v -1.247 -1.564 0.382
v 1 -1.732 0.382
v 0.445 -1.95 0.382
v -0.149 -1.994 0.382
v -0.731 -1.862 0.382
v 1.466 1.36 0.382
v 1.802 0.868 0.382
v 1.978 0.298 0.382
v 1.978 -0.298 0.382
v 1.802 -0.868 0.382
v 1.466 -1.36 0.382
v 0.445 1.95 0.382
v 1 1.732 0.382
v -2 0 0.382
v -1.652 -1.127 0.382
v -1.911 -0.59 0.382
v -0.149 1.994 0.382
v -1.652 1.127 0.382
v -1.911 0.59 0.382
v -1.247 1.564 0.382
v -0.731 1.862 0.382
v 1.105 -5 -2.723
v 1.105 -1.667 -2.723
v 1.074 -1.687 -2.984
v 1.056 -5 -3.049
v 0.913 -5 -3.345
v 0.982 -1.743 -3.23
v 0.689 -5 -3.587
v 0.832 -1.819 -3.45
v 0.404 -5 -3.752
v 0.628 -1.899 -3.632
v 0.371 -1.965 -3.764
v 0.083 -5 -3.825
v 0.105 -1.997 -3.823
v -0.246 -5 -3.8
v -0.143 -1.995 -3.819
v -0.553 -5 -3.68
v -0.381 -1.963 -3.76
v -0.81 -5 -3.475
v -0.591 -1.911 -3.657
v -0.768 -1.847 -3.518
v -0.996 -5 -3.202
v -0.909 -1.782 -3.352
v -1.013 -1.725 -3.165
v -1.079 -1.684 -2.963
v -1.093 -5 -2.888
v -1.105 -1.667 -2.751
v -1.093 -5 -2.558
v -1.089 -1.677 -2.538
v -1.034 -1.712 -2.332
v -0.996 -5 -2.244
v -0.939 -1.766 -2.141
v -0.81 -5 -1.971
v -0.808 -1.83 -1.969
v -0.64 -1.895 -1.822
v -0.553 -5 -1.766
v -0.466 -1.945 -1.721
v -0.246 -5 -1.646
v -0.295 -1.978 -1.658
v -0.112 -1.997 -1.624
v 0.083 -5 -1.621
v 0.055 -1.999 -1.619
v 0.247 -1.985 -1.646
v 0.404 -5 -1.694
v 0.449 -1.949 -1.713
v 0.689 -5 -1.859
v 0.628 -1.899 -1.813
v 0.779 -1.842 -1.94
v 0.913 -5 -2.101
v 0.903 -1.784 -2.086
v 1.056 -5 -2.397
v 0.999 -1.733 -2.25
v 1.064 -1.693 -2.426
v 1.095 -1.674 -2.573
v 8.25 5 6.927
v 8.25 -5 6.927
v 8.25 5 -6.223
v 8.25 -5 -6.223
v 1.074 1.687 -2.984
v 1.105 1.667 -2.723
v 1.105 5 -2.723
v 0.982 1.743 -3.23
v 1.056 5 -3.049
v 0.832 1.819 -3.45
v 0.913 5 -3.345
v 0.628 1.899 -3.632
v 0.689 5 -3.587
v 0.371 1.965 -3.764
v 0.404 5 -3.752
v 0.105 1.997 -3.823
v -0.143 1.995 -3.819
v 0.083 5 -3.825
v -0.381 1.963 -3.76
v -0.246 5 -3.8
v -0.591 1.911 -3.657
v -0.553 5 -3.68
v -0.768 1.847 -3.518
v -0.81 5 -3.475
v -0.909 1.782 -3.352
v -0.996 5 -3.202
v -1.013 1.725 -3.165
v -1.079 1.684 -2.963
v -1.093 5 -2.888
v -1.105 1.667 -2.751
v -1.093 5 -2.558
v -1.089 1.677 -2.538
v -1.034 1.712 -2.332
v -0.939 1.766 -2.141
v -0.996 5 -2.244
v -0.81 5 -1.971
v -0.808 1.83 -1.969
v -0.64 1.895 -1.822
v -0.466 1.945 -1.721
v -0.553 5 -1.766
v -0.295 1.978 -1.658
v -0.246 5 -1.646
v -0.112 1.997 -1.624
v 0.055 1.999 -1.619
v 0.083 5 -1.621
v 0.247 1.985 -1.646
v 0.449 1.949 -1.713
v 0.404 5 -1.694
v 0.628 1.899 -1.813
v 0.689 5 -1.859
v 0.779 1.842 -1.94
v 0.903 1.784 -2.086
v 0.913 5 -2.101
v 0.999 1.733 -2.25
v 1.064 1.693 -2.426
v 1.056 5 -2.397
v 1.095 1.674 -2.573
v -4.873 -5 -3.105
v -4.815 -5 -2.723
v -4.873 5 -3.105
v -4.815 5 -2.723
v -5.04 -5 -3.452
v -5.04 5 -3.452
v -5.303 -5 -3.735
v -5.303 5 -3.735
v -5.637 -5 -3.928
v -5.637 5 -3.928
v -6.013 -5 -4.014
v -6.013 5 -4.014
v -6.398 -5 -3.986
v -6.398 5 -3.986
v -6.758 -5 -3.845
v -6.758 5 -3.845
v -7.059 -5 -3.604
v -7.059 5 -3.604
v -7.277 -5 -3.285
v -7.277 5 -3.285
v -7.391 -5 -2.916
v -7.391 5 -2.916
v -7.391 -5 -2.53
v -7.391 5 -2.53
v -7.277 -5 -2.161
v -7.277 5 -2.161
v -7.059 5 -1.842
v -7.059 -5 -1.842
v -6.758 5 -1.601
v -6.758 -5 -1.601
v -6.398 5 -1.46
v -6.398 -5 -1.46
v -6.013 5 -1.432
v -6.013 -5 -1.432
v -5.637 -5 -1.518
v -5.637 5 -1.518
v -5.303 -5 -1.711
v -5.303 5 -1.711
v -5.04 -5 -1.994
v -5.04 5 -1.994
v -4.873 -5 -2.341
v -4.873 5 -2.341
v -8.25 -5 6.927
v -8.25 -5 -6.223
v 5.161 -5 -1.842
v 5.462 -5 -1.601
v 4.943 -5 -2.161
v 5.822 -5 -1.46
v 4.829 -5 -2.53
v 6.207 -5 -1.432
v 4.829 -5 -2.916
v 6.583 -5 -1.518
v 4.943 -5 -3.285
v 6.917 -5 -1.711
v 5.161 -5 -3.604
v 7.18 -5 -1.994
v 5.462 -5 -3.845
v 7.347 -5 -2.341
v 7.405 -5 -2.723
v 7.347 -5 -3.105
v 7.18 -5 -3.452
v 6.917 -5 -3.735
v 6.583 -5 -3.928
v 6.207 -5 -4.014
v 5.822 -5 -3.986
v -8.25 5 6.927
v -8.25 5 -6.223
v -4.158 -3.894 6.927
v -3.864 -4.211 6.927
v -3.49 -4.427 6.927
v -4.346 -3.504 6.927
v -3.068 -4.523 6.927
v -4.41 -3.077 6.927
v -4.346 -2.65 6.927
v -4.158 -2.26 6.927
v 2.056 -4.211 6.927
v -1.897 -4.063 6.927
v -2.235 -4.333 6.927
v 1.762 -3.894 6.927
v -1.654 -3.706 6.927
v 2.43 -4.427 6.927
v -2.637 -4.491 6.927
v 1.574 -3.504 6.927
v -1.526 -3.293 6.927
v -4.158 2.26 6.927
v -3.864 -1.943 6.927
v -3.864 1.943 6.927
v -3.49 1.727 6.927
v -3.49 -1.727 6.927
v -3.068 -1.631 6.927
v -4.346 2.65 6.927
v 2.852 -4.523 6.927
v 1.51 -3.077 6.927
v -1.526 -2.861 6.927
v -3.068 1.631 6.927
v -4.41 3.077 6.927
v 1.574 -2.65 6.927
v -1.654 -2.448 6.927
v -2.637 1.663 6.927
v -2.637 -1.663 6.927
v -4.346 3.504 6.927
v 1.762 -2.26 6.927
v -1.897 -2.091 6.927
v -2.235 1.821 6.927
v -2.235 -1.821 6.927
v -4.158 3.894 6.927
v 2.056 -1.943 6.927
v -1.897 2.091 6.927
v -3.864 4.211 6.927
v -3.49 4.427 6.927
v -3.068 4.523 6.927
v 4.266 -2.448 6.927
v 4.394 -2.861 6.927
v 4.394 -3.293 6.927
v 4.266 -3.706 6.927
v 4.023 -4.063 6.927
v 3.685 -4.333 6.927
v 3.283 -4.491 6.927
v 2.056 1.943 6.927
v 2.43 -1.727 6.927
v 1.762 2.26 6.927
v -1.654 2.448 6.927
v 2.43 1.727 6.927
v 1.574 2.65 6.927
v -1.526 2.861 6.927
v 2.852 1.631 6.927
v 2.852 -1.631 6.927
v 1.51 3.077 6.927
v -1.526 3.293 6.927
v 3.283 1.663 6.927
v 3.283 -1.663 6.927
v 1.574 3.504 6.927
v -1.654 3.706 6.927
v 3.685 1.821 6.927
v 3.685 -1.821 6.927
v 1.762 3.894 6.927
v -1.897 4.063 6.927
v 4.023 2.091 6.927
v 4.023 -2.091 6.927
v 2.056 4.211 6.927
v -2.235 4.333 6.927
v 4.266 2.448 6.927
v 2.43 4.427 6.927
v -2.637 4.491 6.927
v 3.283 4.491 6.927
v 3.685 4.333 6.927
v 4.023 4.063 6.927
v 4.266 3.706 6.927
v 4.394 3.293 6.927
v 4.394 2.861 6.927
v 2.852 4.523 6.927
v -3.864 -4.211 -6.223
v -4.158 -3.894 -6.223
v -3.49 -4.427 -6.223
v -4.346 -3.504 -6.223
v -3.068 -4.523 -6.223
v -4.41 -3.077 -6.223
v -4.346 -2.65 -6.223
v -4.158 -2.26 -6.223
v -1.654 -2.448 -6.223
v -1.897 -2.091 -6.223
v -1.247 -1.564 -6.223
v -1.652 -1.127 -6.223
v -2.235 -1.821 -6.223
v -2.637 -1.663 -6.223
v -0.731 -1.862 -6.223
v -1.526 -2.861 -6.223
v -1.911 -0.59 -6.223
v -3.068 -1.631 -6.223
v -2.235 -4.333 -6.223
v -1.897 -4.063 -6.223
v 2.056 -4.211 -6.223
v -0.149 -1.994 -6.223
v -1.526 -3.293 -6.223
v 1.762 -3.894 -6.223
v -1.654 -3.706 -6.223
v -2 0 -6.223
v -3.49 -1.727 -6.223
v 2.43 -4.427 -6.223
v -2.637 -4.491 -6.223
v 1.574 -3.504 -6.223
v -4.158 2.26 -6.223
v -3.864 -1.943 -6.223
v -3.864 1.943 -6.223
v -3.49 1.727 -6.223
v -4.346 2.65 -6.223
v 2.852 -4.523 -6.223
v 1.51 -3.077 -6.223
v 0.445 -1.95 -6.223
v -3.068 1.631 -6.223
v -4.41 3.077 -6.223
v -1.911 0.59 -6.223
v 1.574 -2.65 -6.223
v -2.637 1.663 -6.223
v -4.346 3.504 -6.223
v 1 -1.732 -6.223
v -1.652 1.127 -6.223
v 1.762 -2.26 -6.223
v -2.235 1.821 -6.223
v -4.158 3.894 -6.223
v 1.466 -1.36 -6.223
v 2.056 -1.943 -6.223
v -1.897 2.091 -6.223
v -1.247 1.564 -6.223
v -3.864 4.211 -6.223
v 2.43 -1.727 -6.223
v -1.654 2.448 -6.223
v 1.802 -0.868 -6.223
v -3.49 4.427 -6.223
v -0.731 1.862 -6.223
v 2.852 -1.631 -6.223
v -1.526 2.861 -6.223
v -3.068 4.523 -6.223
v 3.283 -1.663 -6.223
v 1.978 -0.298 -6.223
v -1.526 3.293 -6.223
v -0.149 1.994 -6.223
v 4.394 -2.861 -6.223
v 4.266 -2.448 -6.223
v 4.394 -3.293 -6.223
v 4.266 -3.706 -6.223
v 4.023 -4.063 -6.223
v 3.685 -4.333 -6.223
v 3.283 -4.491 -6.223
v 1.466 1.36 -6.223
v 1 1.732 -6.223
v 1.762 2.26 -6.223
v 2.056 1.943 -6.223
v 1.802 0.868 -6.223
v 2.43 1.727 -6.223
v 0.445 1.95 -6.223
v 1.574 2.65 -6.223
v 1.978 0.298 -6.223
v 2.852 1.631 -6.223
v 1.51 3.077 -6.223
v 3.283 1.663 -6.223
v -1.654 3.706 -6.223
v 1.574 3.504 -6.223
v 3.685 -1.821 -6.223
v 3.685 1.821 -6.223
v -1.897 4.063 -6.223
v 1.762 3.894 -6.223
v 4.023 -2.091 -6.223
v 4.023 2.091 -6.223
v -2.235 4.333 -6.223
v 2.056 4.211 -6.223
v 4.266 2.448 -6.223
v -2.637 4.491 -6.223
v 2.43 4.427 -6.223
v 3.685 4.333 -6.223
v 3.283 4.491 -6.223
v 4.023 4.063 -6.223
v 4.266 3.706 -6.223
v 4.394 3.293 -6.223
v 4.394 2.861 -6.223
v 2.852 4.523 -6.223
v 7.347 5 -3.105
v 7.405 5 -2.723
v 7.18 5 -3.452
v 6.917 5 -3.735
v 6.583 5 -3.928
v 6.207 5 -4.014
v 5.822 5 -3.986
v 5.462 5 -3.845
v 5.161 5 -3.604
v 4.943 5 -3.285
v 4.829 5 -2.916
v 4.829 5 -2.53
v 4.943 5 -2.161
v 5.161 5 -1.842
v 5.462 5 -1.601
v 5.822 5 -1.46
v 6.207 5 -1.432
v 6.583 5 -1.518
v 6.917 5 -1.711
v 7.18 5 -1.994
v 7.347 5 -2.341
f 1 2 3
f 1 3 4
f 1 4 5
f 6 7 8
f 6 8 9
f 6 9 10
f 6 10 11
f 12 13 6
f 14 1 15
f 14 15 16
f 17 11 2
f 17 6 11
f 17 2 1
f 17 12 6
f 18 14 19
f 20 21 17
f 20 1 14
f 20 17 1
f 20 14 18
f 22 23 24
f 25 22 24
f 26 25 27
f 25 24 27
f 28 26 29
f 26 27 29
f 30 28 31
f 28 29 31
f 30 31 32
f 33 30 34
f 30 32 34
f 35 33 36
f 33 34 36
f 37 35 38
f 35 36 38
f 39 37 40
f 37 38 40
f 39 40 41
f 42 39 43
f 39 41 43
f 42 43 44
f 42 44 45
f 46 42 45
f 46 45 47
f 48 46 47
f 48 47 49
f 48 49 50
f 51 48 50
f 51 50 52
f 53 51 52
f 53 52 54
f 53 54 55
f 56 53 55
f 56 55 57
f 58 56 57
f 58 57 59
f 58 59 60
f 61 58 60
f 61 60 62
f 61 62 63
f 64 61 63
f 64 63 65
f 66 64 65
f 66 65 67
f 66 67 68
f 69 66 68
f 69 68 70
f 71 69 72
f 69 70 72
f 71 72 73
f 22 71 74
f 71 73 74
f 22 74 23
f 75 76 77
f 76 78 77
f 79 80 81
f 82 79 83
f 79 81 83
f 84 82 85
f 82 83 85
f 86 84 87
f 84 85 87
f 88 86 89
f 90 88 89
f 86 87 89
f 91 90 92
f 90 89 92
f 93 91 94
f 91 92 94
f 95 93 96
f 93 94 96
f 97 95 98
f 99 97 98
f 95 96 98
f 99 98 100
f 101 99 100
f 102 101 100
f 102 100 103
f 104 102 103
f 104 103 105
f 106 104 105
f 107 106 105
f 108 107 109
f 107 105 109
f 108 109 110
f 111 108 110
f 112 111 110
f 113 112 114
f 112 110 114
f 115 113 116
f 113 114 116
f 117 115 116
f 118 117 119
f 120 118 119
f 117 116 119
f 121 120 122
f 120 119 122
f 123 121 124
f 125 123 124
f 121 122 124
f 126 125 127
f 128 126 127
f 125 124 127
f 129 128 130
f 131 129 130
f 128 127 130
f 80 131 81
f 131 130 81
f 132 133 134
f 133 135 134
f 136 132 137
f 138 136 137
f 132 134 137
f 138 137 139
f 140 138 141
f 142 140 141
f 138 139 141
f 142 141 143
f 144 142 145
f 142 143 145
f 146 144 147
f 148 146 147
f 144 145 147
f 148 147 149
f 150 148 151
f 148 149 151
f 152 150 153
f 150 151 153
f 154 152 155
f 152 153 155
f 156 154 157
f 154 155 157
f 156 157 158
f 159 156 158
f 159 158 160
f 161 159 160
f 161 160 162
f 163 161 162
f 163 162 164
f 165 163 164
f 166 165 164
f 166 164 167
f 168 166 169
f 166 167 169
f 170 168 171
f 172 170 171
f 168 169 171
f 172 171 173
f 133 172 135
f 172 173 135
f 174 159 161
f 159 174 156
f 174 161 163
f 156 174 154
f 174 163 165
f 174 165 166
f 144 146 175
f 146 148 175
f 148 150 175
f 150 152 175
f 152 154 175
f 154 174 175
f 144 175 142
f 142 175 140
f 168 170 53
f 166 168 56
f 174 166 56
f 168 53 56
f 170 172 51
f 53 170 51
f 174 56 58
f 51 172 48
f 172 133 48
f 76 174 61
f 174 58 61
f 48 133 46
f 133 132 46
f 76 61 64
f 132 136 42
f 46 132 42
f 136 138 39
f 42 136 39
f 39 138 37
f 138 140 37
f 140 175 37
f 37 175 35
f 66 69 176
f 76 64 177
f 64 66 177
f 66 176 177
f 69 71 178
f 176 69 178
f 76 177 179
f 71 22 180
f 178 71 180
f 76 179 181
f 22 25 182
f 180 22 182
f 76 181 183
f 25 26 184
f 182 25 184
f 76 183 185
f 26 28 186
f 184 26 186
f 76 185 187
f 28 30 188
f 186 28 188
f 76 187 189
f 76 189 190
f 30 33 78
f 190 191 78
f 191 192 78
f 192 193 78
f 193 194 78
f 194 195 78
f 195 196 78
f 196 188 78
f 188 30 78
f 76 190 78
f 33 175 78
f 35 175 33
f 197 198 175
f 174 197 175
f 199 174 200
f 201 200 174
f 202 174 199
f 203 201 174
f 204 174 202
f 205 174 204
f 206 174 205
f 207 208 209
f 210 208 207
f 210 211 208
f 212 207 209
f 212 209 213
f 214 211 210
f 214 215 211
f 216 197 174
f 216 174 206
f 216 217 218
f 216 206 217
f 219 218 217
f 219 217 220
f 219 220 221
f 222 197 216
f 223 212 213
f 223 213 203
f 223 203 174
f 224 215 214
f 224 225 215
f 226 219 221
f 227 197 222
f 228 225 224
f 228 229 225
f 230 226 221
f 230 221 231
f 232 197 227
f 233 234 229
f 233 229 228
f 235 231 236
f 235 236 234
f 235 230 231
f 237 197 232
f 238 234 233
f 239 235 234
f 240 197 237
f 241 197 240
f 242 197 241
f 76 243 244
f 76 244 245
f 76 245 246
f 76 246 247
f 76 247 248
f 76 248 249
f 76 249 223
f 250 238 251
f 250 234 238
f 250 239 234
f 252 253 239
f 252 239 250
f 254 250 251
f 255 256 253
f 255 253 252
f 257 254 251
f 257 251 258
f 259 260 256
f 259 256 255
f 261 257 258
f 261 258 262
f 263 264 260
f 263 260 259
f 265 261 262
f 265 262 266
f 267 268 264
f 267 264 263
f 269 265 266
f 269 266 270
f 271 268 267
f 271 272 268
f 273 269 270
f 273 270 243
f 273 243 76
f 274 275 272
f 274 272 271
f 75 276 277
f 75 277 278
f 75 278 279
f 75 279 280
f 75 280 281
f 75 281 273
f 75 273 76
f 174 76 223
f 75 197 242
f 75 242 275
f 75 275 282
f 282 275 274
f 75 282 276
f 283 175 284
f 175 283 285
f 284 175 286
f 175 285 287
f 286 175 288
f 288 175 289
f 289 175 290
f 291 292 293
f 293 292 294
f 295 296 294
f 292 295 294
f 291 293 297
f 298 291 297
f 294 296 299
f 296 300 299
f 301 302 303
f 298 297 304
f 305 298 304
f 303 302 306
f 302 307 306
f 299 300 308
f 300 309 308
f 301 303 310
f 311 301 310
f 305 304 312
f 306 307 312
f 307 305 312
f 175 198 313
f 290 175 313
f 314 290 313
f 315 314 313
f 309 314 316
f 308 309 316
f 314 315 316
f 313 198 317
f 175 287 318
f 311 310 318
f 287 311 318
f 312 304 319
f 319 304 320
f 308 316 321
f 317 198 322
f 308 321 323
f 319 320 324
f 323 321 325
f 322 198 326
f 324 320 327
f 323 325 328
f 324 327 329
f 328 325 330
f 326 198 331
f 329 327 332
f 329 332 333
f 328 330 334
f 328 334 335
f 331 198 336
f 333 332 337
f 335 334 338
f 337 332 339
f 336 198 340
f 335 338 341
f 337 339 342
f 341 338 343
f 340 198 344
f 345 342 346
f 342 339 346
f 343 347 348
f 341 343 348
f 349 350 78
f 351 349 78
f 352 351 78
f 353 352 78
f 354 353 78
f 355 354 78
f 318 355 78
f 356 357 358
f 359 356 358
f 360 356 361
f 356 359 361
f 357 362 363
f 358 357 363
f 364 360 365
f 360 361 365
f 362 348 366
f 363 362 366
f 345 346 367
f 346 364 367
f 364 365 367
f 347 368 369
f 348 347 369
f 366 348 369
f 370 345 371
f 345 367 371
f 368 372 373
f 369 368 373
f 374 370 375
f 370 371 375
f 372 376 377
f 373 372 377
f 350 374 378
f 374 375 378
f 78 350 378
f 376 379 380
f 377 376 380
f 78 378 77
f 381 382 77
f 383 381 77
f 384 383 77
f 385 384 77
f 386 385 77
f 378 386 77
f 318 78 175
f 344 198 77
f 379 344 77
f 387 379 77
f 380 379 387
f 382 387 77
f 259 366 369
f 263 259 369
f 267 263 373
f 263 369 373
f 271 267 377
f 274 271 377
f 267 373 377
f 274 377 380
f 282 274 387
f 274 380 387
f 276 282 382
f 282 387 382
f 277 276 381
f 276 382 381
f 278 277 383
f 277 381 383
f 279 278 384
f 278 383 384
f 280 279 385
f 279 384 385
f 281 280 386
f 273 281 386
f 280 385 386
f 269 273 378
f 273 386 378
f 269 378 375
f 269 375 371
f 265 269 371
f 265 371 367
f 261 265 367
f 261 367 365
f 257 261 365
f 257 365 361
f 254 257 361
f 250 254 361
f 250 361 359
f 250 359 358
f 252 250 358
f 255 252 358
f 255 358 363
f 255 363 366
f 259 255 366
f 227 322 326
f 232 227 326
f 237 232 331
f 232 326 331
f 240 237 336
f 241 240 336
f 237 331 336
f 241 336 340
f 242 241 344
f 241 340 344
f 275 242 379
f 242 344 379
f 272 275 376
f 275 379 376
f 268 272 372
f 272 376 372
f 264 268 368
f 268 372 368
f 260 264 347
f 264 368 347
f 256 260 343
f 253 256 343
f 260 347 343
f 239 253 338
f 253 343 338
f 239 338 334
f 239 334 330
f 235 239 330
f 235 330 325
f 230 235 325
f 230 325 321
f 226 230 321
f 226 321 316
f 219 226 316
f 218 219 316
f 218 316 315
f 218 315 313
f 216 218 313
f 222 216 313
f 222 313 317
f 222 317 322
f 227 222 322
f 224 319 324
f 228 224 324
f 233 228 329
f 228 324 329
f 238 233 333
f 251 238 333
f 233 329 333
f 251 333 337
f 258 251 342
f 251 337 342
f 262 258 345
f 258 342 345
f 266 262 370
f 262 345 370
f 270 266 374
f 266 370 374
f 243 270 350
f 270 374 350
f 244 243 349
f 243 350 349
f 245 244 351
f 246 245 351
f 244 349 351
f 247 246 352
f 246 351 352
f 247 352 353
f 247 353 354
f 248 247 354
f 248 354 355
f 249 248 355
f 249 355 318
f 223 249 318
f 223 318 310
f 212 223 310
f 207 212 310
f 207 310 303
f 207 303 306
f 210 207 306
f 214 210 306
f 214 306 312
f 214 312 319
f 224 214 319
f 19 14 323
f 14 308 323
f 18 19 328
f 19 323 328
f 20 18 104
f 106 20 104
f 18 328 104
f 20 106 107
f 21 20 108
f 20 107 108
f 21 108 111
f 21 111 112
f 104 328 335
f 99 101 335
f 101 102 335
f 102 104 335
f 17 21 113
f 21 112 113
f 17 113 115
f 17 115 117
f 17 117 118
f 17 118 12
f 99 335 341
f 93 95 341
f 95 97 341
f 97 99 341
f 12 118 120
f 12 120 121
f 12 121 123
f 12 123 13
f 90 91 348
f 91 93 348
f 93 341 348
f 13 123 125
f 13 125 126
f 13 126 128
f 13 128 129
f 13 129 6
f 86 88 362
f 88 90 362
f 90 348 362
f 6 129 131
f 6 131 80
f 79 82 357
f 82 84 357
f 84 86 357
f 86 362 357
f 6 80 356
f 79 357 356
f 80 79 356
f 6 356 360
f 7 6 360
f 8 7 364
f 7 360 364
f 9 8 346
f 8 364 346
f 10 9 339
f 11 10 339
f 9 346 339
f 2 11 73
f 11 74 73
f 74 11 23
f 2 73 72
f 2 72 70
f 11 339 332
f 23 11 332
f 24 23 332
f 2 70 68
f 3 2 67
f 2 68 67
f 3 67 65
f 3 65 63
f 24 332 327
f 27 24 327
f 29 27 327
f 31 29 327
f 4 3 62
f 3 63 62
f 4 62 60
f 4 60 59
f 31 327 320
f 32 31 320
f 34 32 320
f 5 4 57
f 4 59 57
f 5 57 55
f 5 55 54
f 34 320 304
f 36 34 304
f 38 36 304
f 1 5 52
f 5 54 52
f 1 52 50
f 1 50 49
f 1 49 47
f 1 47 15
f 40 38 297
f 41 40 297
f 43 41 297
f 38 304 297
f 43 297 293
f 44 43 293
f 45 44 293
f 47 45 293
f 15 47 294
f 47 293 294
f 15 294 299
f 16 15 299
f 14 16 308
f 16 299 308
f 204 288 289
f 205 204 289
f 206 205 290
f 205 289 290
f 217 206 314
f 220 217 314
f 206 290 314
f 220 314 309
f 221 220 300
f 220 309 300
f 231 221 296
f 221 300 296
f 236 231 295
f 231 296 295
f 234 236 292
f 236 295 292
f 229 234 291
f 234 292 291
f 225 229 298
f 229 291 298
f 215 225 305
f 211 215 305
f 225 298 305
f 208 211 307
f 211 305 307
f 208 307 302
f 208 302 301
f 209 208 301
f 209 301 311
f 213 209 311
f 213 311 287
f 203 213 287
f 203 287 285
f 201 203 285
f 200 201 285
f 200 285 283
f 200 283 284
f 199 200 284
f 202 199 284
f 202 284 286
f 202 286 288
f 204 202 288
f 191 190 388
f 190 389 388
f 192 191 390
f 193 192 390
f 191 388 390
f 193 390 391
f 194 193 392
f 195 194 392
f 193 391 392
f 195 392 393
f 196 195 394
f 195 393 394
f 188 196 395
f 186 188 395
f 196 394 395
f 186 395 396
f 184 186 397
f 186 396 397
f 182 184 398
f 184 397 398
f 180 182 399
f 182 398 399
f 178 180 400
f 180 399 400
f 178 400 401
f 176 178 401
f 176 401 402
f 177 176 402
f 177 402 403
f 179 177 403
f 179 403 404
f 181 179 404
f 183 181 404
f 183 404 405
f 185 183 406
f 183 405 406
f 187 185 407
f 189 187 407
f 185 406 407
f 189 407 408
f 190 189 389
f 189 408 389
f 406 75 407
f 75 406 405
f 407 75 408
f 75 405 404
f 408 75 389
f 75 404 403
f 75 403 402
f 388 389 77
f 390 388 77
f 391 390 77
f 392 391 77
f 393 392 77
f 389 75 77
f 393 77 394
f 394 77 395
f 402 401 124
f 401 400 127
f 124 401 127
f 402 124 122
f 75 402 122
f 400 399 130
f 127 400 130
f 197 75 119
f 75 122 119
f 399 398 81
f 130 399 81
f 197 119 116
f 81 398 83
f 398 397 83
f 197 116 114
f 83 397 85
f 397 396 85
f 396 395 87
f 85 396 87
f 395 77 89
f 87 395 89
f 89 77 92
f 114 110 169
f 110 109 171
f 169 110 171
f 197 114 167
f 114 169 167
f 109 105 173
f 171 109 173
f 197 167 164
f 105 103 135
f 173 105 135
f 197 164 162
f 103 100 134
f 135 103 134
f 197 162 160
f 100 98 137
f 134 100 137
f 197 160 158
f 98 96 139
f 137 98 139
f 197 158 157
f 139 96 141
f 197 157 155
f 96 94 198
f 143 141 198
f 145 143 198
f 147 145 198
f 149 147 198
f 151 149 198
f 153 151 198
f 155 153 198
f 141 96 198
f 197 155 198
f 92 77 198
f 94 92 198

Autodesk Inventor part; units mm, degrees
ref_plane "YZ Plane" through (0, 0, 0) normal (1, 0, 0) x (0, 1, 0)
ref_plane "XZ Plane" through (0, 0, 0) normal (0, 1, 0) x (-1, 0, 0)
ref_plane "XY Plane" through (0, 0, 0) normal (0, 0, 1) x (1, 0, 0)
sketch "Sketch1" plane through (0, 0, 0) normal (0, 0, 1) x (1, 0, 0)
  line L0 (8.25, 5) -> (-8.25, 5)
  line L1 (-8.25, 5) -> (-8.25, -5)
  line L2 (-8.25, -5) -> (8.25, -5)
  line L3 (8.25, -5) -> (8.25, 5)
  point P0 (0, 0)
  dimension "d19" = 10
  dimension "d36" = 16.5
  dimension "d37" = 5
extrude "Box" add sketch "Sketch1" along normal blind 6.927 and the other way blind 6.223
sketch "Sketch3" plane through (0, 0, -6.223) normal (0, 0, -1) x (-1, 0, 0)
  line L0 (-5.08, 0) -> (5.08, 0) construction
  line L1 (-4.75, 0) -> (4.75, 0) construction
  circle A0 centre (0, 0) radius 2
  dimension "d35" = 4
extrude "Slot" cut sketch "Sketch3" against normal blind 6.605
sketch "Sketch4" plane through (0, 0, -6.223) normal (0, 0, -1) x (-1, 0, 0)
  circle A0 centre (-2.96, 3.0769) radius 1.45
  line L0 (8.25, 5) -> (-8.25, 5) projected
  circle A1 centre (0, 0) radius 2 projected
  line L1 (-8.25, 5) -> (-8.25, -5) projected
  dimension "d32" = 2.9
  dimension "d34" = 1.9231
  dimension "d39" = 5.29
  dimension "d40" = 5
extrude "MountingHole" cut sketch "Sketch4" against normal blind 15 contours A0
pattern_linear "Mounting Holes" count 2 spacing 5.92 along (-1, 0, 0) count 2 spacing 6.154 along (0, -1, 0) of "MountingHole"
sketch "Sketch6" plane through (-8.25, 5, 6.927) normal (0, 1, 0) x (1, 0, 0)
  circle A0 centre (8.25, 9.65) radius 1.105
  line L0 (0, 13.15) -> (16.5, 13.15) projected
  dimension "d20" = 2.21
  dimension "d46" = 3.5
extrude "CentralSMAHole" cut sketch "Sketch6" against normal blind 12
sketch "Sketch8" plane through (-8.25, 5, 6.927) normal (0, 1, 0) x (1, 0, 0)
  circle A0 centre (14.36, 9.65) radius 1.295
  line L0 (0, 13.15) -> (16.5, 13.15) projected
  dimension "d23" = 2.59
  dimension "d45" = 3.5
extrude "SMAMounting" cut sketch "Sketch8" against normal blind 12
pattern_linear "SMAMountingHoles" count 2 spacing 12.22 along (-1, 0, 0) of "SMAMounting"
equation "\"d37\" = 0.5 * d19"
equation "\"d34\" = 0.384615 * d40"
properties part number "NewSinkV4"
